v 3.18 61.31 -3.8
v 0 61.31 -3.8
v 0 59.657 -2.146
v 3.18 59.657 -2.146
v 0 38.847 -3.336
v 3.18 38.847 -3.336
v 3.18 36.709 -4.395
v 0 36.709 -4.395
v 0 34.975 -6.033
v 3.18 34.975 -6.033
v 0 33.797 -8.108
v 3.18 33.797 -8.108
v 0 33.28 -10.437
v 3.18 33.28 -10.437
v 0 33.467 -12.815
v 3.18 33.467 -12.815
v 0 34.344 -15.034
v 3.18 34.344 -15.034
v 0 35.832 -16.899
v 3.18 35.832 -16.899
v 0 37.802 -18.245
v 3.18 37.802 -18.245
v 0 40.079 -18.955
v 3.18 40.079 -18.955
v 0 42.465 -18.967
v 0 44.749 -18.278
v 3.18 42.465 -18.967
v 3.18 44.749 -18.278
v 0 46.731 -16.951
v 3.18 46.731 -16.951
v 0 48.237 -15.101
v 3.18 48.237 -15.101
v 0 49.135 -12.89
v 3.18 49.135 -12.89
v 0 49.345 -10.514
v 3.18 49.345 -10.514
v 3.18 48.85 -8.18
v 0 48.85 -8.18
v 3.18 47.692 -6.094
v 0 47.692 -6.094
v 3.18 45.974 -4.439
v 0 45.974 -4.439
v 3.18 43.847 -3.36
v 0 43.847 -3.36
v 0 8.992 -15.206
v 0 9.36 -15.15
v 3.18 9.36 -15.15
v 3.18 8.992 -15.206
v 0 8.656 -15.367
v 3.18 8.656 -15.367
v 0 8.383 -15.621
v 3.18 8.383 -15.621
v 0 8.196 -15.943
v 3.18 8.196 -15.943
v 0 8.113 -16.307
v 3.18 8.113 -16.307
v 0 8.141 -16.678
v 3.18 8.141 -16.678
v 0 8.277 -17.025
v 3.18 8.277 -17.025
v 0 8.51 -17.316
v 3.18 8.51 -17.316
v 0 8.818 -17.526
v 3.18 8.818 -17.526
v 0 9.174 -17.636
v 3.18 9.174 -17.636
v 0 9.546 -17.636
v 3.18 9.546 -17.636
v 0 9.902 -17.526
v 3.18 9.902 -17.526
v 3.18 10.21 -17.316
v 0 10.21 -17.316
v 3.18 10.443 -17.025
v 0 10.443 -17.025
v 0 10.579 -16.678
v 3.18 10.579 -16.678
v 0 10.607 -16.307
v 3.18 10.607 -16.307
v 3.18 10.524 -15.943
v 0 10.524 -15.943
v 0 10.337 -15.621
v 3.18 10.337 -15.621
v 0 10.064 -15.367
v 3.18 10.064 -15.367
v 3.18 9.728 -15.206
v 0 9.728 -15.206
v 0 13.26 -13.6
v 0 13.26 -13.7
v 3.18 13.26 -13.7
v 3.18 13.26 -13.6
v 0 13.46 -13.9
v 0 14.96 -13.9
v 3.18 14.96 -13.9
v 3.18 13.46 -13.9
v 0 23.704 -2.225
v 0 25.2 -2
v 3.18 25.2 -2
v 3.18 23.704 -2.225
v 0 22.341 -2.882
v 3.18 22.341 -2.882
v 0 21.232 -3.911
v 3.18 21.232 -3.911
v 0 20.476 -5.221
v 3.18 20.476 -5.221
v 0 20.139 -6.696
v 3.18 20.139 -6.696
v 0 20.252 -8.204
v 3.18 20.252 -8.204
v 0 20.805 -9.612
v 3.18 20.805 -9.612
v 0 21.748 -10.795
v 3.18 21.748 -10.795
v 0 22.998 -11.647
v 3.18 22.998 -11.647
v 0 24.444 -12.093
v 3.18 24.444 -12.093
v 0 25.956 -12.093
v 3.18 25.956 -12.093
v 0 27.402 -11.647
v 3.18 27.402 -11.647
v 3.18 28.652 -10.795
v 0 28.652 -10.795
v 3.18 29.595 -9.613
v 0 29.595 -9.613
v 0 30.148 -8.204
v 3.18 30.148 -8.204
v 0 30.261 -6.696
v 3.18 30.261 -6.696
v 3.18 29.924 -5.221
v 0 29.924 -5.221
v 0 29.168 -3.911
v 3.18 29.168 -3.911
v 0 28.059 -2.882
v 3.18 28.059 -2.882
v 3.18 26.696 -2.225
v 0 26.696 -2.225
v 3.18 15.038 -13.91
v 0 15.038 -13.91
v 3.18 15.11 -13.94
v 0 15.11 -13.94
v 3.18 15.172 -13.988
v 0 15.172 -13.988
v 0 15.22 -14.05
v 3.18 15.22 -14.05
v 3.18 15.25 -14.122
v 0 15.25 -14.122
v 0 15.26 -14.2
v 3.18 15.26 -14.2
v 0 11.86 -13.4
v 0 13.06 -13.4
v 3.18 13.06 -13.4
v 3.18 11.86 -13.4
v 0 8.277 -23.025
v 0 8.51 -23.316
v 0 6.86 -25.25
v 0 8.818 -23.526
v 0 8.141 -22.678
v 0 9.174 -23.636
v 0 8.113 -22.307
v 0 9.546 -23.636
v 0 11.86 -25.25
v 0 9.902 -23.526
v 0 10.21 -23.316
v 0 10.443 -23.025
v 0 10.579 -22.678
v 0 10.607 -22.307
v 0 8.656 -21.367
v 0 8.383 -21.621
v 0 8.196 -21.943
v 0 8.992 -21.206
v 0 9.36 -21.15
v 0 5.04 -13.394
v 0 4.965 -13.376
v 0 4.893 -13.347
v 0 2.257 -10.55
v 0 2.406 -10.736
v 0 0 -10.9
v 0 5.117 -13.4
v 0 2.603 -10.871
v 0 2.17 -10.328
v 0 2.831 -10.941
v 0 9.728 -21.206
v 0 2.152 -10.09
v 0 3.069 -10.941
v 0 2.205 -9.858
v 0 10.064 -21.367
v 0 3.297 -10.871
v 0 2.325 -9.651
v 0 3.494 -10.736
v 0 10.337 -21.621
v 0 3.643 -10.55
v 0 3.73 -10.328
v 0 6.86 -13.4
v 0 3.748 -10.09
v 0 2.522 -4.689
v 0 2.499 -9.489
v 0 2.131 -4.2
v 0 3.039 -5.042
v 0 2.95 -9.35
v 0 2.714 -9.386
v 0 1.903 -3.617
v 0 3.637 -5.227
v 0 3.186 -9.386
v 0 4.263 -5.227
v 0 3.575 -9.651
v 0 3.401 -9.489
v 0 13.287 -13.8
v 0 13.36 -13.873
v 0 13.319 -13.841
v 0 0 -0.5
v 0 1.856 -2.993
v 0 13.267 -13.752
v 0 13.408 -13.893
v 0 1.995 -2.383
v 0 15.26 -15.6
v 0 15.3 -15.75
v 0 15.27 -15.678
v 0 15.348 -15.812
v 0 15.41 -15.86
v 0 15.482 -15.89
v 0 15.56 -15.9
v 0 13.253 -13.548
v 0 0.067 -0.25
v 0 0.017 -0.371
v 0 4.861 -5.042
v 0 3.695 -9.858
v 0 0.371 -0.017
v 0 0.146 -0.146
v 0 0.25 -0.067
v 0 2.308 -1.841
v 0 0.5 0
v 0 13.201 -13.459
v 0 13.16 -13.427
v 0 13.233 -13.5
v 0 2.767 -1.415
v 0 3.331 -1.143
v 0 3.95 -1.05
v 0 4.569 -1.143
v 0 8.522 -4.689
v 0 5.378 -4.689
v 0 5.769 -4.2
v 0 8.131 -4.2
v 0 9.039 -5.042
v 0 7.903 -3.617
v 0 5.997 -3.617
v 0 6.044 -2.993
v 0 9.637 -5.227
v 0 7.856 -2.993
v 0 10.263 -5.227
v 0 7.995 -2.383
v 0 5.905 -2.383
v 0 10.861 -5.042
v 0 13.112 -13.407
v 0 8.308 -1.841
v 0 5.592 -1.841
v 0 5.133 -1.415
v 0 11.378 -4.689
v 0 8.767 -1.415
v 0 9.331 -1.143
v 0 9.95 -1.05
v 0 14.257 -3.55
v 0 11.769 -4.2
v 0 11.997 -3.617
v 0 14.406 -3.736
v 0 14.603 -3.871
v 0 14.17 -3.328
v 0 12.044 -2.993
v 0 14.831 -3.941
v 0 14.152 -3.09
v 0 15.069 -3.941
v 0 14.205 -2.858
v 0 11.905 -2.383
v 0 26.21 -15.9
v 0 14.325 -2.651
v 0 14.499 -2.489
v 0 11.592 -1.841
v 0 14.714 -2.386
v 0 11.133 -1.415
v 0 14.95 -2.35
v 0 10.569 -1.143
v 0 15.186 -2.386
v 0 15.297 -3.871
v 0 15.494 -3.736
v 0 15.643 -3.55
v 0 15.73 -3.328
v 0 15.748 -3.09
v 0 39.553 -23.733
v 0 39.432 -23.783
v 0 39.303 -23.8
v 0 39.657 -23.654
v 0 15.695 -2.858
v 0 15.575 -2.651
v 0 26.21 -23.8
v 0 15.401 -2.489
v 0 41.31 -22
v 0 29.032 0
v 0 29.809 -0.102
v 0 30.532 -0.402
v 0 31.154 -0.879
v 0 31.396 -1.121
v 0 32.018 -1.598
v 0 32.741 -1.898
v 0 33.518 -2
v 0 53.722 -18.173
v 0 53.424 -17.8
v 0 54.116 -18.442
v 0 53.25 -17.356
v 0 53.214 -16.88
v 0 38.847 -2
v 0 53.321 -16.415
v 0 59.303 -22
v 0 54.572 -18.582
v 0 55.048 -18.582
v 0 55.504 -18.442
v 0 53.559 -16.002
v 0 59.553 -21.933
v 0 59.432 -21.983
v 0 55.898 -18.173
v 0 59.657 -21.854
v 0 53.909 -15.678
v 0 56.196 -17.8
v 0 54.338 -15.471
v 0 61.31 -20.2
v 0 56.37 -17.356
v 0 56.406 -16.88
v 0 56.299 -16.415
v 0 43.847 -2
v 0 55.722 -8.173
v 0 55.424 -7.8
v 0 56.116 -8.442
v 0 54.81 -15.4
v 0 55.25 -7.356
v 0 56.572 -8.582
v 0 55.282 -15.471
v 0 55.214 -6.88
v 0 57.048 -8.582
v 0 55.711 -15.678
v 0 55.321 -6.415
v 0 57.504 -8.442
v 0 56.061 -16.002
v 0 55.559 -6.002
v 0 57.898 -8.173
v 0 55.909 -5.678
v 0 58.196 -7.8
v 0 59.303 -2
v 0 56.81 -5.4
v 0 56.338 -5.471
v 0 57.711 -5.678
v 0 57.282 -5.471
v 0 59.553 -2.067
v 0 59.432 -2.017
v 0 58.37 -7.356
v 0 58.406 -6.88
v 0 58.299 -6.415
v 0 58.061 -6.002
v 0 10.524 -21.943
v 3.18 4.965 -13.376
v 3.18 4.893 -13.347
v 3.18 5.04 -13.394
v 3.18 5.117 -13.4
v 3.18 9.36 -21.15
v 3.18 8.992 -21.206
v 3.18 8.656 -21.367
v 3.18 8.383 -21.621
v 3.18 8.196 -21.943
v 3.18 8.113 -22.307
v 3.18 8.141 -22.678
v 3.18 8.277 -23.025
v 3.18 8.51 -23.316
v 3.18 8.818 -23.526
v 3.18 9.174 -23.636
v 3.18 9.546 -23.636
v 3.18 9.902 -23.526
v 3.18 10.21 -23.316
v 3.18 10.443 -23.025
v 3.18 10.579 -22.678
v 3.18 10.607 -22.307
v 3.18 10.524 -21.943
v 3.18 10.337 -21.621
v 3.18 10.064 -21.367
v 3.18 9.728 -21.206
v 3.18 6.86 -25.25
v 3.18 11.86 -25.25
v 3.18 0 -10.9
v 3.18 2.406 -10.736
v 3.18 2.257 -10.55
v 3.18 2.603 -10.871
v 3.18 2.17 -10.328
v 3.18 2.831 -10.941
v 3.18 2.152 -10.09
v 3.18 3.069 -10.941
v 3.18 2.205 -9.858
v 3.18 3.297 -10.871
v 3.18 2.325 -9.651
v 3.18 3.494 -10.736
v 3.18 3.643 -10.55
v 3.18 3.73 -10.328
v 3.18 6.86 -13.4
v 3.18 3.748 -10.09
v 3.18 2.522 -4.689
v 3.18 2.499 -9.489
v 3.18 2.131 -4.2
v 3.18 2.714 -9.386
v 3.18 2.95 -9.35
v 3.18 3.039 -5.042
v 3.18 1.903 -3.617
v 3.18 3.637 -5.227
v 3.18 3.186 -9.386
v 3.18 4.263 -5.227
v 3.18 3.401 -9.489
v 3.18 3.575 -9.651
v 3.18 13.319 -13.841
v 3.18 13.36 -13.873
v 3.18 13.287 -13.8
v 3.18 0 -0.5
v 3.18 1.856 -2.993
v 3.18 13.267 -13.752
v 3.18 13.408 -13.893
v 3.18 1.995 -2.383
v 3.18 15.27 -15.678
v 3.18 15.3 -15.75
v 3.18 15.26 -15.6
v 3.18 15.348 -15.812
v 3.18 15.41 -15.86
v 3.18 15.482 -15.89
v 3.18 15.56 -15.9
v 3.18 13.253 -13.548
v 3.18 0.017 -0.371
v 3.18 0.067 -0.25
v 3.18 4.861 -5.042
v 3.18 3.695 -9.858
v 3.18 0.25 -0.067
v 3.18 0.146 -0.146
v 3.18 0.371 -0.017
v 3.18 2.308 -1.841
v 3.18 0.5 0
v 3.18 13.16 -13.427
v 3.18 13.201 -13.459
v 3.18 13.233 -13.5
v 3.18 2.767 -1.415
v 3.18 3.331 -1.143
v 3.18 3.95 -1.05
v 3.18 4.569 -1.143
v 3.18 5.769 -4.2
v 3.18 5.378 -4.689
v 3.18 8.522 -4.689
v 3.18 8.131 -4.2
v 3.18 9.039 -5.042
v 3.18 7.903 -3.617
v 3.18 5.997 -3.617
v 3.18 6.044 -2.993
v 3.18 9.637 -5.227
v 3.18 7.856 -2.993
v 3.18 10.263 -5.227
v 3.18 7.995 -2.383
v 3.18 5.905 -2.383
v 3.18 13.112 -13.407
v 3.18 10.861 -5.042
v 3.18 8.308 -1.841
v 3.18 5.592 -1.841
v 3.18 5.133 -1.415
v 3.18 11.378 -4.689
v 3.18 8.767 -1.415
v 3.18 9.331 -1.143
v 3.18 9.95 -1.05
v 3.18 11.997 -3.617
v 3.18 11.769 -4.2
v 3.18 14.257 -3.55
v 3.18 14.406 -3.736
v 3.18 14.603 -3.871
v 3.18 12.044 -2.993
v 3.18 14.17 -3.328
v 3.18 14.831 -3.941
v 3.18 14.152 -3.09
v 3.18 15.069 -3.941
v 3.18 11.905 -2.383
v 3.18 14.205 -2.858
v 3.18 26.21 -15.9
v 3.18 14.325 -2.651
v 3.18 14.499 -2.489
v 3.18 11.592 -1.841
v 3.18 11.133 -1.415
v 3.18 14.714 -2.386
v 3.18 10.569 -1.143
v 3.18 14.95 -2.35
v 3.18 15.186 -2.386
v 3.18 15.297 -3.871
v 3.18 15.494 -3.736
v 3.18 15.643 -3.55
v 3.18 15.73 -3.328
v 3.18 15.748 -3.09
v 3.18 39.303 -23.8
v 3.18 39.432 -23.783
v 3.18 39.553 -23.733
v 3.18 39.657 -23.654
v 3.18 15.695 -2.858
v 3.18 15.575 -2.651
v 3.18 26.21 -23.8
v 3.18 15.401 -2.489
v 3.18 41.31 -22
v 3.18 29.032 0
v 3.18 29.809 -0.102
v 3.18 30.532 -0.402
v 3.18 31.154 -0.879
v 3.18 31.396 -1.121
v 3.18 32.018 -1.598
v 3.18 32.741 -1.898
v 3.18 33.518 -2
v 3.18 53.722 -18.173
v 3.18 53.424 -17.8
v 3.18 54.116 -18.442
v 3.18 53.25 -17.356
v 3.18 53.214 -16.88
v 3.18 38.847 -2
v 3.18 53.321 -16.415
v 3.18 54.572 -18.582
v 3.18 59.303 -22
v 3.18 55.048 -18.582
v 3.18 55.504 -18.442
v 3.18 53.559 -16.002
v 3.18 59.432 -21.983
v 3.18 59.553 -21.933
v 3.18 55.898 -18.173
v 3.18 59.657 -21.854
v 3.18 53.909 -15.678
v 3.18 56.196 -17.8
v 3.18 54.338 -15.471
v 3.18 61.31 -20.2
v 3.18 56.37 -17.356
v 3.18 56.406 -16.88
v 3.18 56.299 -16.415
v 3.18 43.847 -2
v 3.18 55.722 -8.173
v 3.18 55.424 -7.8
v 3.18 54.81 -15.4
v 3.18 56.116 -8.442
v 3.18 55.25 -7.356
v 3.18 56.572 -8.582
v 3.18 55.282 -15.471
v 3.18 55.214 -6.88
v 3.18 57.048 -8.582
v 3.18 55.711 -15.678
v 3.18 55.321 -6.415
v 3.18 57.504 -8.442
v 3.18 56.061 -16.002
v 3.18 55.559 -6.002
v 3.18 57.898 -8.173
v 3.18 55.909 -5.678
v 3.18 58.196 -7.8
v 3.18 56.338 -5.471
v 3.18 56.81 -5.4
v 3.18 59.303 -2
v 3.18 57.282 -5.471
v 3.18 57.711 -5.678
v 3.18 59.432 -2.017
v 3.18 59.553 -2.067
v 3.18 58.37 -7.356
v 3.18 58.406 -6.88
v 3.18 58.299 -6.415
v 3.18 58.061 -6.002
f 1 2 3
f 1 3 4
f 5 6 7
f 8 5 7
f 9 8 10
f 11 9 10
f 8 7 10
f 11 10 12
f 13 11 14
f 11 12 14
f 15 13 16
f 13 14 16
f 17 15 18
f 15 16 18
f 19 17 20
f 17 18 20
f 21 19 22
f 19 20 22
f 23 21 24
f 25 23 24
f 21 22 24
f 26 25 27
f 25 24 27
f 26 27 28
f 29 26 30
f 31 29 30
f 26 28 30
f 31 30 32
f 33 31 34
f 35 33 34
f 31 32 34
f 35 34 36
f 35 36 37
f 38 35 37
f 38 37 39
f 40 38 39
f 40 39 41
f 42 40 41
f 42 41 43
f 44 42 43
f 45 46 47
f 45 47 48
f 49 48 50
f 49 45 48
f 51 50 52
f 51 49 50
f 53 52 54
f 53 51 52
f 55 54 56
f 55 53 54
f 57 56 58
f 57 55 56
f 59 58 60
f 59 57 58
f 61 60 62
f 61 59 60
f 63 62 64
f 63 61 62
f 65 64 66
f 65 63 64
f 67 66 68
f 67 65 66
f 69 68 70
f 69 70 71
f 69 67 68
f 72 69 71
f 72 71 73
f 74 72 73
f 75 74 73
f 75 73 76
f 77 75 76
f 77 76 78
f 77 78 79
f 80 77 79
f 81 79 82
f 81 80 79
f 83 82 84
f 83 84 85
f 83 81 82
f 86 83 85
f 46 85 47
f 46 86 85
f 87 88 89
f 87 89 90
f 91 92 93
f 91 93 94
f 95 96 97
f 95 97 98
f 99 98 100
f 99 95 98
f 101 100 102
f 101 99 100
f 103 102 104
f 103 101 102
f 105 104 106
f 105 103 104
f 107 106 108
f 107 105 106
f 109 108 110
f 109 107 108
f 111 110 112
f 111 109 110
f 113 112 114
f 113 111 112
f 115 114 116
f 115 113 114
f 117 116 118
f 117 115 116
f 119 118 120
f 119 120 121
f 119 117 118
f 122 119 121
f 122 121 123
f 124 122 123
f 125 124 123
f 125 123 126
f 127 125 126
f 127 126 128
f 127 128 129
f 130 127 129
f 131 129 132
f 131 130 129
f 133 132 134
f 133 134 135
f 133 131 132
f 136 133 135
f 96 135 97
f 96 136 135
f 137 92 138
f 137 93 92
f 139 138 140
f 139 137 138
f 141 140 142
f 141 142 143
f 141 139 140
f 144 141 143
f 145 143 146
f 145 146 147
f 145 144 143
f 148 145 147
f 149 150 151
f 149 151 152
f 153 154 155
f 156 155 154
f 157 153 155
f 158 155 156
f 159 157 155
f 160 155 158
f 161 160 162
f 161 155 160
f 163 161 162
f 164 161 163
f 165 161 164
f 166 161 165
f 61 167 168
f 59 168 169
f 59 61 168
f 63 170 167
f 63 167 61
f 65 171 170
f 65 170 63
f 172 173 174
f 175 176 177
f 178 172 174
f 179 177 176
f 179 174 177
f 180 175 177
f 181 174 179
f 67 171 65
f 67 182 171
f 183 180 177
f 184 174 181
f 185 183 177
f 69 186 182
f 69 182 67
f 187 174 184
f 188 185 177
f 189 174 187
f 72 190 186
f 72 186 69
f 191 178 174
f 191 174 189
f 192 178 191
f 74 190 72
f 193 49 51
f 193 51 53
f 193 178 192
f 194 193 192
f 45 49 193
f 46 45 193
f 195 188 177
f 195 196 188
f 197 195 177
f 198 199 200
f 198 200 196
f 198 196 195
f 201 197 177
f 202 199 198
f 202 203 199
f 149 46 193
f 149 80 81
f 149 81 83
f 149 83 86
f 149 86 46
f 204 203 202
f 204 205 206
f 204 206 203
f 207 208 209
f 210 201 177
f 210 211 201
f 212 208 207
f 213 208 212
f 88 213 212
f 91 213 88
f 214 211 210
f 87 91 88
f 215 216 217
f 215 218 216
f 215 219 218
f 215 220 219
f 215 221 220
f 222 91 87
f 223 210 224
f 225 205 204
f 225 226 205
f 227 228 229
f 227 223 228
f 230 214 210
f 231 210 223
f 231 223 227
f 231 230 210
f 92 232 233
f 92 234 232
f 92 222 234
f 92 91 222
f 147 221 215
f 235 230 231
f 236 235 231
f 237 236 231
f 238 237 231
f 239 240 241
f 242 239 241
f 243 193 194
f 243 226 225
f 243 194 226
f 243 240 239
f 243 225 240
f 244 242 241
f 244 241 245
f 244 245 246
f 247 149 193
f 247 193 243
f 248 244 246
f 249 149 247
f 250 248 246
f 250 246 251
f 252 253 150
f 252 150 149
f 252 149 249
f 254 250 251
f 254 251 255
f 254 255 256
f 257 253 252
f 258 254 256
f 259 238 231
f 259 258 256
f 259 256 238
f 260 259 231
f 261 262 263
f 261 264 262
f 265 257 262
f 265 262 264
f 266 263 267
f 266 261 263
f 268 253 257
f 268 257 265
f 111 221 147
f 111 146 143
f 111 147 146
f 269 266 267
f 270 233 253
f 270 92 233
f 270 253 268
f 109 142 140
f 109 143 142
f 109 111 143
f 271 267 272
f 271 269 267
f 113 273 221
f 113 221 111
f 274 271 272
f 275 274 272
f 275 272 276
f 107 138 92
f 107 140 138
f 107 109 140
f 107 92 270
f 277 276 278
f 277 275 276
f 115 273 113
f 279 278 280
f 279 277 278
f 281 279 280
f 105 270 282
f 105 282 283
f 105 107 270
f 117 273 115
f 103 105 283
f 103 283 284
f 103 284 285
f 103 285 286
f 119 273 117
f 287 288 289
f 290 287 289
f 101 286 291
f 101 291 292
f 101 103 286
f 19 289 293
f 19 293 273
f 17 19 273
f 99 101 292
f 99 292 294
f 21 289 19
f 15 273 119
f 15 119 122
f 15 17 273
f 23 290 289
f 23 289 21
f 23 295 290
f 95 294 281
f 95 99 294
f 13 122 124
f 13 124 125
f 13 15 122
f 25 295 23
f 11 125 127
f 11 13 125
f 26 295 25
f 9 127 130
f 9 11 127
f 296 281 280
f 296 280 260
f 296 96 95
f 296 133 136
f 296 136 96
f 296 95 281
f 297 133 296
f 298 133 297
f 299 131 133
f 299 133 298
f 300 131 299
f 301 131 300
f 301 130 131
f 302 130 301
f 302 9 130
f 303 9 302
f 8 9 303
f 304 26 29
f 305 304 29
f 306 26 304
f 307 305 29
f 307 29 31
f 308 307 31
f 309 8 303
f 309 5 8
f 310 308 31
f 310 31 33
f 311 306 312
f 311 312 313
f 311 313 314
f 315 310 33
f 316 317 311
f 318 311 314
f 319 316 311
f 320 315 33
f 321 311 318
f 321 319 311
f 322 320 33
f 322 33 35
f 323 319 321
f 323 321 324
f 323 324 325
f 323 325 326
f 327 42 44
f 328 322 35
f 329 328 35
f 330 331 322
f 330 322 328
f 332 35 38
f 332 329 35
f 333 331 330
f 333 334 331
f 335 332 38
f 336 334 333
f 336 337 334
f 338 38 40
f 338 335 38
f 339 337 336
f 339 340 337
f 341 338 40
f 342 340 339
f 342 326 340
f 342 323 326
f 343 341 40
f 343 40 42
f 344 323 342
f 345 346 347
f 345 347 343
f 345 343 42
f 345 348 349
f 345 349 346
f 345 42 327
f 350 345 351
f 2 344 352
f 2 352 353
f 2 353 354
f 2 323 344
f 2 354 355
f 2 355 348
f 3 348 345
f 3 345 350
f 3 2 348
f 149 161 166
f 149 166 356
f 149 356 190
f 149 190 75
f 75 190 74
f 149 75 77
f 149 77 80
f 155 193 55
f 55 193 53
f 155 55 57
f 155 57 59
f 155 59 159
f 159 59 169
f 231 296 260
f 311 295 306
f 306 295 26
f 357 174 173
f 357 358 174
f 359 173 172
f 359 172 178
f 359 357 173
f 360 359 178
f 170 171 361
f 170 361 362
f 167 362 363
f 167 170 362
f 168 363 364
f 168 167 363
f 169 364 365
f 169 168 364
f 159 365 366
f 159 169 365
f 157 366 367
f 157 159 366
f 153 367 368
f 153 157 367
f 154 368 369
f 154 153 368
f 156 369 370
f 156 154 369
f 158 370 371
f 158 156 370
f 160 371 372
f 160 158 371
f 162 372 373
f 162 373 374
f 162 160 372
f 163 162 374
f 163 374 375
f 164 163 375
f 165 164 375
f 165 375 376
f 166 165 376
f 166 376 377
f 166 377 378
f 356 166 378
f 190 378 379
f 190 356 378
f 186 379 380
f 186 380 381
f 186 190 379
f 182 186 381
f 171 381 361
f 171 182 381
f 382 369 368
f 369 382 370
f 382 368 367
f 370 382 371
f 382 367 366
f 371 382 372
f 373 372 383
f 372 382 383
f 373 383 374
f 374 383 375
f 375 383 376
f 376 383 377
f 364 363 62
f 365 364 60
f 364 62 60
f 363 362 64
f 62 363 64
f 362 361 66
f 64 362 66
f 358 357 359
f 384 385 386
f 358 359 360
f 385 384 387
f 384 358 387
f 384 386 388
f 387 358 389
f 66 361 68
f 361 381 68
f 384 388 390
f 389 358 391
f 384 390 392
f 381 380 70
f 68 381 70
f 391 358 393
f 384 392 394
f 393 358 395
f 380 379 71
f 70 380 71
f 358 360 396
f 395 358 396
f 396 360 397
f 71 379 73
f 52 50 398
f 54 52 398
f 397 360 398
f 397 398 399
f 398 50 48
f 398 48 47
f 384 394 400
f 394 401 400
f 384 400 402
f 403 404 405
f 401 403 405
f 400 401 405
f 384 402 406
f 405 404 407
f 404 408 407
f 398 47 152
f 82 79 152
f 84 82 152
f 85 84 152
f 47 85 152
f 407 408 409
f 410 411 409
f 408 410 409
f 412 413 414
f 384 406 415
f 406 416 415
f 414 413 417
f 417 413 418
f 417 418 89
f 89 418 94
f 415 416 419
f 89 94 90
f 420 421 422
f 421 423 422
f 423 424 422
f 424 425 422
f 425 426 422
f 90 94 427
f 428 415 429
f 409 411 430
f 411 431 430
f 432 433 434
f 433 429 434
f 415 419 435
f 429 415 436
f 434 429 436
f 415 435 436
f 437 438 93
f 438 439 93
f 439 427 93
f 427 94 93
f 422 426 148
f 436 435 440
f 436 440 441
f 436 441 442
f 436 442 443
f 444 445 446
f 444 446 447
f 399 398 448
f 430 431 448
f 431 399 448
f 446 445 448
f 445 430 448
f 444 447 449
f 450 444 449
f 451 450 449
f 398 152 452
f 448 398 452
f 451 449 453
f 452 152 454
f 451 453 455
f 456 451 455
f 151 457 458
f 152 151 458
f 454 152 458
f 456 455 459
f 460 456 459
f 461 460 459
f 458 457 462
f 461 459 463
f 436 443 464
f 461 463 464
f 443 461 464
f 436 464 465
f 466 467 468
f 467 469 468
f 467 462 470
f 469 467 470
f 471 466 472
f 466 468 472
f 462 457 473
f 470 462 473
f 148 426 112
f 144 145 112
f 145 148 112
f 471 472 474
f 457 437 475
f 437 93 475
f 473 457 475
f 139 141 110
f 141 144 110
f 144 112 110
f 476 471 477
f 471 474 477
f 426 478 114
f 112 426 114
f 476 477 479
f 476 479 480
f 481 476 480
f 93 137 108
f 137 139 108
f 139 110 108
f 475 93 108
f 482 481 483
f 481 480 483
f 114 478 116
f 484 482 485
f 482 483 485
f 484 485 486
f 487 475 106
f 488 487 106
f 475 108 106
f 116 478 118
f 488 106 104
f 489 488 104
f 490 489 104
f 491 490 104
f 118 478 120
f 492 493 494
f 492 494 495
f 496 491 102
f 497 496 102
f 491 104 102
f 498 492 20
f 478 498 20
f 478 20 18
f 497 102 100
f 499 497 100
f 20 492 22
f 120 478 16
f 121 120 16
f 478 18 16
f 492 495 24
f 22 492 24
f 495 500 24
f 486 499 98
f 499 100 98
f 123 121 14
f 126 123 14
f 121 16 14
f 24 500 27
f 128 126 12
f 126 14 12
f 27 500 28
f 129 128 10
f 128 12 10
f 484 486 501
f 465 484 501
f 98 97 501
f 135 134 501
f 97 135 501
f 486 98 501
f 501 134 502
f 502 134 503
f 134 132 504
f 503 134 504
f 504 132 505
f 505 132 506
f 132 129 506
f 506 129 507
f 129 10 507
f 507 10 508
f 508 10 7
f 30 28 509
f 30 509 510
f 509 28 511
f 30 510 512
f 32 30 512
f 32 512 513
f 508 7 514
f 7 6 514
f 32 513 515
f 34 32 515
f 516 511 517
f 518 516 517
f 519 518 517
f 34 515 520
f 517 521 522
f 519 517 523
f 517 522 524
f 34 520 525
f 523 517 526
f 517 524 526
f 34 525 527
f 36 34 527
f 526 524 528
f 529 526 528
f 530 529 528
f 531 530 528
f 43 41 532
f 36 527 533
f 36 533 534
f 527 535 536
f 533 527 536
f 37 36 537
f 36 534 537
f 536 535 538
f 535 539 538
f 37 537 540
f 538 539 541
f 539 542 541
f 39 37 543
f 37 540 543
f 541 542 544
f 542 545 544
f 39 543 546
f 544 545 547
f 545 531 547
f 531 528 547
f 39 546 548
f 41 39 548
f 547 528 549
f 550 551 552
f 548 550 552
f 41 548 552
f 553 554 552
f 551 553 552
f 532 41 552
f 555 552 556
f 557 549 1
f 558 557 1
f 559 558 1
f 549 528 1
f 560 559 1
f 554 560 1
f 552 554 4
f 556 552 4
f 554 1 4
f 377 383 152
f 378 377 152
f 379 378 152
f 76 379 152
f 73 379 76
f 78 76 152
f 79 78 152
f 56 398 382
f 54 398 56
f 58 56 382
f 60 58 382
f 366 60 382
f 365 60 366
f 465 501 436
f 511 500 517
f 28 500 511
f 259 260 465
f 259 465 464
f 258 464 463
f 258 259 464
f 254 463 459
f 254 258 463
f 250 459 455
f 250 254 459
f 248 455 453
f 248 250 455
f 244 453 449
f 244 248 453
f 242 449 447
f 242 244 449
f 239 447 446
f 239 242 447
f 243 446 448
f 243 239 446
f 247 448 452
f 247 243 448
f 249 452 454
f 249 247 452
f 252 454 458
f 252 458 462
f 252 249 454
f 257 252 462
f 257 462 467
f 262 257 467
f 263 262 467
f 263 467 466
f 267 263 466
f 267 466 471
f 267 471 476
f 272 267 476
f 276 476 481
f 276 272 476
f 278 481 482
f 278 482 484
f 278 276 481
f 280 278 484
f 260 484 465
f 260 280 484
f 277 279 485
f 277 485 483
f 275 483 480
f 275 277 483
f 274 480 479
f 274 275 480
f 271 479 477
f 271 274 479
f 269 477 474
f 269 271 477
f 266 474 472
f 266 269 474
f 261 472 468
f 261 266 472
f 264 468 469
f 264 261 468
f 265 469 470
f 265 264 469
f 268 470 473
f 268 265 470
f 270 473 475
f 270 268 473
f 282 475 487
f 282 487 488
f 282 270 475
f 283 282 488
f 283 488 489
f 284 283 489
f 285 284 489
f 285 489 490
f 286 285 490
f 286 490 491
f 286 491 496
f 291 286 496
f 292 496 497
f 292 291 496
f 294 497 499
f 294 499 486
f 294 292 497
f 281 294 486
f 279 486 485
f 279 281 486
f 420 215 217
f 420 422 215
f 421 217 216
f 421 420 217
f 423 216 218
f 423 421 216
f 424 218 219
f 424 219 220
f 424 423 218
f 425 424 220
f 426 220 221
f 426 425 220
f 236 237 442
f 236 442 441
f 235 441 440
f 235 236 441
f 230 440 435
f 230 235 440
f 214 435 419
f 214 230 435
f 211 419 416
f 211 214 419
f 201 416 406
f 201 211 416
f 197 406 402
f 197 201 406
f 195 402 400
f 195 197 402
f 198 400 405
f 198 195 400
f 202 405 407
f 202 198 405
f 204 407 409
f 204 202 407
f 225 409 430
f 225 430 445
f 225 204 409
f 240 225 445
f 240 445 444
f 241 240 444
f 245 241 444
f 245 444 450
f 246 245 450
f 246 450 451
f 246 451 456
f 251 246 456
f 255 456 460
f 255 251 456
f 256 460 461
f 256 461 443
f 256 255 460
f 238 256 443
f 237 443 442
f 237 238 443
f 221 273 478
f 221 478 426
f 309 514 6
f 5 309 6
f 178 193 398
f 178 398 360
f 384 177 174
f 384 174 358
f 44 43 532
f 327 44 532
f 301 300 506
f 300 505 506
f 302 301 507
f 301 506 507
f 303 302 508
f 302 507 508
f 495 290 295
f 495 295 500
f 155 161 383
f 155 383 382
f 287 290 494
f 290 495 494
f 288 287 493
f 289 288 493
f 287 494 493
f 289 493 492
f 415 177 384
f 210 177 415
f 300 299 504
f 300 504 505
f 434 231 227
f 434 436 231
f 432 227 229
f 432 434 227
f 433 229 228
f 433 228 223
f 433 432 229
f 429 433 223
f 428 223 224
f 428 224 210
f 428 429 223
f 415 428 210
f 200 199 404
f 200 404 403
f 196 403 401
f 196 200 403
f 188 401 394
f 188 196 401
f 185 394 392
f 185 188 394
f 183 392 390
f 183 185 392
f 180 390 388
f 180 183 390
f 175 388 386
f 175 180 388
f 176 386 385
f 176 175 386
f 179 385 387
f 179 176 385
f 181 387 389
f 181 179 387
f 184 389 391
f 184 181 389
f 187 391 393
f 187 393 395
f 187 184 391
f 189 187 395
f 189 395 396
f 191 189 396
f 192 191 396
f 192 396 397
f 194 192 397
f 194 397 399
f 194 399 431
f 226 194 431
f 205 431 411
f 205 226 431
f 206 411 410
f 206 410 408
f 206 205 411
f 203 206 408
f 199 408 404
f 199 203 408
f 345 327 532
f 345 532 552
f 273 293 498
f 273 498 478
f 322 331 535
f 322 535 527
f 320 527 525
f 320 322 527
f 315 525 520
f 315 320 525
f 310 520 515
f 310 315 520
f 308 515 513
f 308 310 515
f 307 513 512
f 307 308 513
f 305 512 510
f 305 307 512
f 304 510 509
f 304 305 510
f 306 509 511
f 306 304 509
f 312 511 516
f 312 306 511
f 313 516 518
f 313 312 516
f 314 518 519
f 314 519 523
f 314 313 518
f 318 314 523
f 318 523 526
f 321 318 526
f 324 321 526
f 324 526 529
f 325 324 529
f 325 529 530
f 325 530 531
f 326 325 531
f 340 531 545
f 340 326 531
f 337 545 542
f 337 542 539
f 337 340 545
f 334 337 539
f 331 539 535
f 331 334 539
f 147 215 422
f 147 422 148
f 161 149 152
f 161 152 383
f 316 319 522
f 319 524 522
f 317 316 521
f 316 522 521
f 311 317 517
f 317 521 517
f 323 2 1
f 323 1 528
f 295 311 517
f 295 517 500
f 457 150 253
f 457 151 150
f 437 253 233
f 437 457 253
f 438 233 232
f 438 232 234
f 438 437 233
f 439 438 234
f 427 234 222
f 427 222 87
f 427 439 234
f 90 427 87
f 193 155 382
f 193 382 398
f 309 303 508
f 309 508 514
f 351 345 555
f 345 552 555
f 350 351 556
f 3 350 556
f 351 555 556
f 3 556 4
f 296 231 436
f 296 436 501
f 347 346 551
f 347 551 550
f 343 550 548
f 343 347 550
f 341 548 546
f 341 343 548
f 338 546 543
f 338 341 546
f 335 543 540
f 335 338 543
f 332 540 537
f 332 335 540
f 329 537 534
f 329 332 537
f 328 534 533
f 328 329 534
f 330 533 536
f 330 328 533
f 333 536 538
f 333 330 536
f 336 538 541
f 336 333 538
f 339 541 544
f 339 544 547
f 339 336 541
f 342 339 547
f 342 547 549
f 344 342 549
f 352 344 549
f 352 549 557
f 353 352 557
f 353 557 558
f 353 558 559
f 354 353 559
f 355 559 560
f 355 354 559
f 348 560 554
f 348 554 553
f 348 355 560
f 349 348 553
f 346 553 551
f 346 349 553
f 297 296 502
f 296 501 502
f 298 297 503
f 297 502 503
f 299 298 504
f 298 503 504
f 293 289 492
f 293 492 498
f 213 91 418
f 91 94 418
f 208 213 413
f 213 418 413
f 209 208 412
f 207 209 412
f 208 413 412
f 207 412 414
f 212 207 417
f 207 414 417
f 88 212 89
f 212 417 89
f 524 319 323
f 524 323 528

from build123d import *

# Parameters (mm, degrees)
SKETCH1_R             = 5.075
SKETCH1_R_2           = 1.6
SKETCH1_R_3           = 1.25
SKETCH1_R_4           = 2.1
SKETCH1_R_5           = 0.8
BOSS_EXTRUDE1_DEPTH   = 3.18
CHAMFER1_SIZE         = 2.5
CHAMFER1_SIZE2        = 4.998920521
FILLET2_R             = 3
CHAMFER2_SIZE         = 1.8
FILLET4_R             = 0.5
FILLET7_R             = 0.2
M3X0_5_TAPPED_HOLE1_D = 2.5
M2_TAPPED_HOLE1_D     = 1.6
FILLET8_R             = 0.3
CUT_EXTRUDE5_DEPTH    = 4


with BuildPart() as part:
    # Sketch1 → Boss-Extrude1 (new body)
    with BuildSketch(Plane(origin=(0, 0, 0), x_dir=(0, 0, -1), z_dir=(1, 0, 0))):
        Polygon((0, 0), (0, 30.275), (2, 32.275), (2, 61.31), (22, 61.31), (22, 41.31), (23.8, 41.31), (23.8, 26.21), (15.9, 26.21), (15.9, 15.26), (13.9, 15.26), (13.9, 13.26), (13.4, 13.26), (13.4, 11.86), (25.25, 11.86), (25.25, 6.86), (13.4, 6.86), (13.4, 0), align=None)
        with Locations(Location((7.075, 25.2, 0), (0, 0, 180))):
            Circle(SKETCH1_R, mode=Mode.SUBTRACT)
        with Locations(Location((7, 56.81, 0), (0, 0, 180))):
            Circle(SKETCH1_R_2, mode=Mode.SUBTRACT)
        with Locations(Location((17, 54.81, 0), (0, 0, 180))):
            Circle(SKETCH1_R_2, mode=Mode.SUBTRACT)
        with Locations(Location((22.4, 9.36, 0), (0, 0, 180))):
            Circle(SKETCH1_R_3, mode=Mode.SUBTRACT)
        with Locations(Location((16.4, 9.36, 0), (0, 0, 180))):
            Circle(SKETCH1_R_3, mode=Mode.SUBTRACT)
        with Locations(Location((3.15, 3.95, 0), (0, 0, 180))):
            Circle(SKETCH1_R_4, mode=Mode.SUBTRACT)
        with Locations(Location((3.15, 9.95, 0), (0, 0, 180))):
            Circle(SKETCH1_R_4, mode=Mode.SUBTRACT)
        with Locations(Location((10.15, 2.95, 0), (0, 0, 180))):
            Circle(SKETCH1_R_5, mode=Mode.SUBTRACT)
        with Locations(Location((3.15, 14.95, 0), (0, 0, 180))):
            Circle(SKETCH1_R_5, mode=Mode.SUBTRACT)
    extrude(amount=BOSS_EXTRUDE1_DEPTH)

    # Chamfer1
    chamfer1_edges = [part.edges().sort_by_distance(p)[0] for p in [
        (1.59, 0, -13.4),
    ]]
    chamfer1_side = [part.faces().sort_by_distance(p)[0] for p in [
        (1.59, 0, -6.7),
    ]]
    chamfer(chamfer1_edges, length=CHAMFER1_SIZE, length2=CHAMFER1_SIZE2, reference=chamfer1_side[0])

    # Fillet2
    fillet2_edges = [part.edges().sort_by_distance(p)[0] for p in [
        (1.59, 30.275, 0),
        (1.59, 32.275, -2),
    ]]
    fillet(fillet2_edges, radius=FILLET2_R)

    # Chamfer2
    chamfer2_edges = [part.edges().sort_by_distance(p)[0] for p in [
        (1.59, 61.31, -22),
        (1.59, 61.31, -2),
        (1.59, 41.31, -23.8),
    ]]
    chamfer(chamfer2_edges, length=CHAMFER2_SIZE - 0.0001)  # a hair under: the kernel refuses the full size

    # Fillet4
    fillet4_edges = [part.edges().sort_by_distance(p)[0] for p in [
        (1.59, 39.5101, -23.8),
        (1.59, 59.5101, -22),
        (1.59, 59.5101, -2),
        (1.59, 0, 0),
        (1.59, 4.998920521, -13.4),
    ]]
    fillet(fillet4_edges, radius=FILLET4_R)

    # Fillet7
    fillet7_edges = [part.edges().sort_by_distance(p)[0] for p in [
        (1.59, 13.26, -13.9),
        (1.59, 13.26, -13.4),
    ]]
    fillet(fillet7_edges, radius=FILLET7_R)

    # M3x0.5 Tapped Hole1 (through all)
    with Locations(Plane(origin=(3.18, 0, 0), x_dir=(0, 0, -1), z_dir=(1, 0, 0))):
        with Locations((16.4, 9.36), (22.4, 9.36)):
            Hole(M3X0_5_TAPPED_HOLE1_D / 2)

    # M2 Tapped Hole1 (through all)
    with Locations(Plane(origin=(0, 14.95, -3.15), x_dir=(0, 0, -1), z_dir=(-1, 0, 0))):
        with Locations((0, 0), (7, 12)):
            Hole(M2_TAPPED_HOLE1_D / 2)

    # Fillet8
    fillet8_edges = [part.edges().sort_by_distance(p)[0] for p in [
        (1.59, 15.26, -15.9),
        (1.59, 15.26, -13.9),
    ]]
    fillet(fillet8_edges, radius=FILLET8_R)

    # Sketch13 → Cut-Extrude5 (cut)
    with BuildSketch(Plane(origin=(3.18, 0, 0), x_dir=(0, 0, -1), z_dir=(1, 0, 0))):
        with BuildLine():
            Line((2, 43.846624835), (2, 38.846624835))
            Line((2, 38.846624835), (3.336170487, 38.846624835))
            ThreePointArc((3.336170487, 38.846624835), (19.049907791, 41.271469968), (3.360102459, 43.846624835))
            Line((3.360102459, 43.846624835), (2, 43.846624835))
        make_face()
    extrude(amount=-CUT_EXTRUDE5_DEPTH, mode=Mode.SUBTRACT)


solid = part.part
